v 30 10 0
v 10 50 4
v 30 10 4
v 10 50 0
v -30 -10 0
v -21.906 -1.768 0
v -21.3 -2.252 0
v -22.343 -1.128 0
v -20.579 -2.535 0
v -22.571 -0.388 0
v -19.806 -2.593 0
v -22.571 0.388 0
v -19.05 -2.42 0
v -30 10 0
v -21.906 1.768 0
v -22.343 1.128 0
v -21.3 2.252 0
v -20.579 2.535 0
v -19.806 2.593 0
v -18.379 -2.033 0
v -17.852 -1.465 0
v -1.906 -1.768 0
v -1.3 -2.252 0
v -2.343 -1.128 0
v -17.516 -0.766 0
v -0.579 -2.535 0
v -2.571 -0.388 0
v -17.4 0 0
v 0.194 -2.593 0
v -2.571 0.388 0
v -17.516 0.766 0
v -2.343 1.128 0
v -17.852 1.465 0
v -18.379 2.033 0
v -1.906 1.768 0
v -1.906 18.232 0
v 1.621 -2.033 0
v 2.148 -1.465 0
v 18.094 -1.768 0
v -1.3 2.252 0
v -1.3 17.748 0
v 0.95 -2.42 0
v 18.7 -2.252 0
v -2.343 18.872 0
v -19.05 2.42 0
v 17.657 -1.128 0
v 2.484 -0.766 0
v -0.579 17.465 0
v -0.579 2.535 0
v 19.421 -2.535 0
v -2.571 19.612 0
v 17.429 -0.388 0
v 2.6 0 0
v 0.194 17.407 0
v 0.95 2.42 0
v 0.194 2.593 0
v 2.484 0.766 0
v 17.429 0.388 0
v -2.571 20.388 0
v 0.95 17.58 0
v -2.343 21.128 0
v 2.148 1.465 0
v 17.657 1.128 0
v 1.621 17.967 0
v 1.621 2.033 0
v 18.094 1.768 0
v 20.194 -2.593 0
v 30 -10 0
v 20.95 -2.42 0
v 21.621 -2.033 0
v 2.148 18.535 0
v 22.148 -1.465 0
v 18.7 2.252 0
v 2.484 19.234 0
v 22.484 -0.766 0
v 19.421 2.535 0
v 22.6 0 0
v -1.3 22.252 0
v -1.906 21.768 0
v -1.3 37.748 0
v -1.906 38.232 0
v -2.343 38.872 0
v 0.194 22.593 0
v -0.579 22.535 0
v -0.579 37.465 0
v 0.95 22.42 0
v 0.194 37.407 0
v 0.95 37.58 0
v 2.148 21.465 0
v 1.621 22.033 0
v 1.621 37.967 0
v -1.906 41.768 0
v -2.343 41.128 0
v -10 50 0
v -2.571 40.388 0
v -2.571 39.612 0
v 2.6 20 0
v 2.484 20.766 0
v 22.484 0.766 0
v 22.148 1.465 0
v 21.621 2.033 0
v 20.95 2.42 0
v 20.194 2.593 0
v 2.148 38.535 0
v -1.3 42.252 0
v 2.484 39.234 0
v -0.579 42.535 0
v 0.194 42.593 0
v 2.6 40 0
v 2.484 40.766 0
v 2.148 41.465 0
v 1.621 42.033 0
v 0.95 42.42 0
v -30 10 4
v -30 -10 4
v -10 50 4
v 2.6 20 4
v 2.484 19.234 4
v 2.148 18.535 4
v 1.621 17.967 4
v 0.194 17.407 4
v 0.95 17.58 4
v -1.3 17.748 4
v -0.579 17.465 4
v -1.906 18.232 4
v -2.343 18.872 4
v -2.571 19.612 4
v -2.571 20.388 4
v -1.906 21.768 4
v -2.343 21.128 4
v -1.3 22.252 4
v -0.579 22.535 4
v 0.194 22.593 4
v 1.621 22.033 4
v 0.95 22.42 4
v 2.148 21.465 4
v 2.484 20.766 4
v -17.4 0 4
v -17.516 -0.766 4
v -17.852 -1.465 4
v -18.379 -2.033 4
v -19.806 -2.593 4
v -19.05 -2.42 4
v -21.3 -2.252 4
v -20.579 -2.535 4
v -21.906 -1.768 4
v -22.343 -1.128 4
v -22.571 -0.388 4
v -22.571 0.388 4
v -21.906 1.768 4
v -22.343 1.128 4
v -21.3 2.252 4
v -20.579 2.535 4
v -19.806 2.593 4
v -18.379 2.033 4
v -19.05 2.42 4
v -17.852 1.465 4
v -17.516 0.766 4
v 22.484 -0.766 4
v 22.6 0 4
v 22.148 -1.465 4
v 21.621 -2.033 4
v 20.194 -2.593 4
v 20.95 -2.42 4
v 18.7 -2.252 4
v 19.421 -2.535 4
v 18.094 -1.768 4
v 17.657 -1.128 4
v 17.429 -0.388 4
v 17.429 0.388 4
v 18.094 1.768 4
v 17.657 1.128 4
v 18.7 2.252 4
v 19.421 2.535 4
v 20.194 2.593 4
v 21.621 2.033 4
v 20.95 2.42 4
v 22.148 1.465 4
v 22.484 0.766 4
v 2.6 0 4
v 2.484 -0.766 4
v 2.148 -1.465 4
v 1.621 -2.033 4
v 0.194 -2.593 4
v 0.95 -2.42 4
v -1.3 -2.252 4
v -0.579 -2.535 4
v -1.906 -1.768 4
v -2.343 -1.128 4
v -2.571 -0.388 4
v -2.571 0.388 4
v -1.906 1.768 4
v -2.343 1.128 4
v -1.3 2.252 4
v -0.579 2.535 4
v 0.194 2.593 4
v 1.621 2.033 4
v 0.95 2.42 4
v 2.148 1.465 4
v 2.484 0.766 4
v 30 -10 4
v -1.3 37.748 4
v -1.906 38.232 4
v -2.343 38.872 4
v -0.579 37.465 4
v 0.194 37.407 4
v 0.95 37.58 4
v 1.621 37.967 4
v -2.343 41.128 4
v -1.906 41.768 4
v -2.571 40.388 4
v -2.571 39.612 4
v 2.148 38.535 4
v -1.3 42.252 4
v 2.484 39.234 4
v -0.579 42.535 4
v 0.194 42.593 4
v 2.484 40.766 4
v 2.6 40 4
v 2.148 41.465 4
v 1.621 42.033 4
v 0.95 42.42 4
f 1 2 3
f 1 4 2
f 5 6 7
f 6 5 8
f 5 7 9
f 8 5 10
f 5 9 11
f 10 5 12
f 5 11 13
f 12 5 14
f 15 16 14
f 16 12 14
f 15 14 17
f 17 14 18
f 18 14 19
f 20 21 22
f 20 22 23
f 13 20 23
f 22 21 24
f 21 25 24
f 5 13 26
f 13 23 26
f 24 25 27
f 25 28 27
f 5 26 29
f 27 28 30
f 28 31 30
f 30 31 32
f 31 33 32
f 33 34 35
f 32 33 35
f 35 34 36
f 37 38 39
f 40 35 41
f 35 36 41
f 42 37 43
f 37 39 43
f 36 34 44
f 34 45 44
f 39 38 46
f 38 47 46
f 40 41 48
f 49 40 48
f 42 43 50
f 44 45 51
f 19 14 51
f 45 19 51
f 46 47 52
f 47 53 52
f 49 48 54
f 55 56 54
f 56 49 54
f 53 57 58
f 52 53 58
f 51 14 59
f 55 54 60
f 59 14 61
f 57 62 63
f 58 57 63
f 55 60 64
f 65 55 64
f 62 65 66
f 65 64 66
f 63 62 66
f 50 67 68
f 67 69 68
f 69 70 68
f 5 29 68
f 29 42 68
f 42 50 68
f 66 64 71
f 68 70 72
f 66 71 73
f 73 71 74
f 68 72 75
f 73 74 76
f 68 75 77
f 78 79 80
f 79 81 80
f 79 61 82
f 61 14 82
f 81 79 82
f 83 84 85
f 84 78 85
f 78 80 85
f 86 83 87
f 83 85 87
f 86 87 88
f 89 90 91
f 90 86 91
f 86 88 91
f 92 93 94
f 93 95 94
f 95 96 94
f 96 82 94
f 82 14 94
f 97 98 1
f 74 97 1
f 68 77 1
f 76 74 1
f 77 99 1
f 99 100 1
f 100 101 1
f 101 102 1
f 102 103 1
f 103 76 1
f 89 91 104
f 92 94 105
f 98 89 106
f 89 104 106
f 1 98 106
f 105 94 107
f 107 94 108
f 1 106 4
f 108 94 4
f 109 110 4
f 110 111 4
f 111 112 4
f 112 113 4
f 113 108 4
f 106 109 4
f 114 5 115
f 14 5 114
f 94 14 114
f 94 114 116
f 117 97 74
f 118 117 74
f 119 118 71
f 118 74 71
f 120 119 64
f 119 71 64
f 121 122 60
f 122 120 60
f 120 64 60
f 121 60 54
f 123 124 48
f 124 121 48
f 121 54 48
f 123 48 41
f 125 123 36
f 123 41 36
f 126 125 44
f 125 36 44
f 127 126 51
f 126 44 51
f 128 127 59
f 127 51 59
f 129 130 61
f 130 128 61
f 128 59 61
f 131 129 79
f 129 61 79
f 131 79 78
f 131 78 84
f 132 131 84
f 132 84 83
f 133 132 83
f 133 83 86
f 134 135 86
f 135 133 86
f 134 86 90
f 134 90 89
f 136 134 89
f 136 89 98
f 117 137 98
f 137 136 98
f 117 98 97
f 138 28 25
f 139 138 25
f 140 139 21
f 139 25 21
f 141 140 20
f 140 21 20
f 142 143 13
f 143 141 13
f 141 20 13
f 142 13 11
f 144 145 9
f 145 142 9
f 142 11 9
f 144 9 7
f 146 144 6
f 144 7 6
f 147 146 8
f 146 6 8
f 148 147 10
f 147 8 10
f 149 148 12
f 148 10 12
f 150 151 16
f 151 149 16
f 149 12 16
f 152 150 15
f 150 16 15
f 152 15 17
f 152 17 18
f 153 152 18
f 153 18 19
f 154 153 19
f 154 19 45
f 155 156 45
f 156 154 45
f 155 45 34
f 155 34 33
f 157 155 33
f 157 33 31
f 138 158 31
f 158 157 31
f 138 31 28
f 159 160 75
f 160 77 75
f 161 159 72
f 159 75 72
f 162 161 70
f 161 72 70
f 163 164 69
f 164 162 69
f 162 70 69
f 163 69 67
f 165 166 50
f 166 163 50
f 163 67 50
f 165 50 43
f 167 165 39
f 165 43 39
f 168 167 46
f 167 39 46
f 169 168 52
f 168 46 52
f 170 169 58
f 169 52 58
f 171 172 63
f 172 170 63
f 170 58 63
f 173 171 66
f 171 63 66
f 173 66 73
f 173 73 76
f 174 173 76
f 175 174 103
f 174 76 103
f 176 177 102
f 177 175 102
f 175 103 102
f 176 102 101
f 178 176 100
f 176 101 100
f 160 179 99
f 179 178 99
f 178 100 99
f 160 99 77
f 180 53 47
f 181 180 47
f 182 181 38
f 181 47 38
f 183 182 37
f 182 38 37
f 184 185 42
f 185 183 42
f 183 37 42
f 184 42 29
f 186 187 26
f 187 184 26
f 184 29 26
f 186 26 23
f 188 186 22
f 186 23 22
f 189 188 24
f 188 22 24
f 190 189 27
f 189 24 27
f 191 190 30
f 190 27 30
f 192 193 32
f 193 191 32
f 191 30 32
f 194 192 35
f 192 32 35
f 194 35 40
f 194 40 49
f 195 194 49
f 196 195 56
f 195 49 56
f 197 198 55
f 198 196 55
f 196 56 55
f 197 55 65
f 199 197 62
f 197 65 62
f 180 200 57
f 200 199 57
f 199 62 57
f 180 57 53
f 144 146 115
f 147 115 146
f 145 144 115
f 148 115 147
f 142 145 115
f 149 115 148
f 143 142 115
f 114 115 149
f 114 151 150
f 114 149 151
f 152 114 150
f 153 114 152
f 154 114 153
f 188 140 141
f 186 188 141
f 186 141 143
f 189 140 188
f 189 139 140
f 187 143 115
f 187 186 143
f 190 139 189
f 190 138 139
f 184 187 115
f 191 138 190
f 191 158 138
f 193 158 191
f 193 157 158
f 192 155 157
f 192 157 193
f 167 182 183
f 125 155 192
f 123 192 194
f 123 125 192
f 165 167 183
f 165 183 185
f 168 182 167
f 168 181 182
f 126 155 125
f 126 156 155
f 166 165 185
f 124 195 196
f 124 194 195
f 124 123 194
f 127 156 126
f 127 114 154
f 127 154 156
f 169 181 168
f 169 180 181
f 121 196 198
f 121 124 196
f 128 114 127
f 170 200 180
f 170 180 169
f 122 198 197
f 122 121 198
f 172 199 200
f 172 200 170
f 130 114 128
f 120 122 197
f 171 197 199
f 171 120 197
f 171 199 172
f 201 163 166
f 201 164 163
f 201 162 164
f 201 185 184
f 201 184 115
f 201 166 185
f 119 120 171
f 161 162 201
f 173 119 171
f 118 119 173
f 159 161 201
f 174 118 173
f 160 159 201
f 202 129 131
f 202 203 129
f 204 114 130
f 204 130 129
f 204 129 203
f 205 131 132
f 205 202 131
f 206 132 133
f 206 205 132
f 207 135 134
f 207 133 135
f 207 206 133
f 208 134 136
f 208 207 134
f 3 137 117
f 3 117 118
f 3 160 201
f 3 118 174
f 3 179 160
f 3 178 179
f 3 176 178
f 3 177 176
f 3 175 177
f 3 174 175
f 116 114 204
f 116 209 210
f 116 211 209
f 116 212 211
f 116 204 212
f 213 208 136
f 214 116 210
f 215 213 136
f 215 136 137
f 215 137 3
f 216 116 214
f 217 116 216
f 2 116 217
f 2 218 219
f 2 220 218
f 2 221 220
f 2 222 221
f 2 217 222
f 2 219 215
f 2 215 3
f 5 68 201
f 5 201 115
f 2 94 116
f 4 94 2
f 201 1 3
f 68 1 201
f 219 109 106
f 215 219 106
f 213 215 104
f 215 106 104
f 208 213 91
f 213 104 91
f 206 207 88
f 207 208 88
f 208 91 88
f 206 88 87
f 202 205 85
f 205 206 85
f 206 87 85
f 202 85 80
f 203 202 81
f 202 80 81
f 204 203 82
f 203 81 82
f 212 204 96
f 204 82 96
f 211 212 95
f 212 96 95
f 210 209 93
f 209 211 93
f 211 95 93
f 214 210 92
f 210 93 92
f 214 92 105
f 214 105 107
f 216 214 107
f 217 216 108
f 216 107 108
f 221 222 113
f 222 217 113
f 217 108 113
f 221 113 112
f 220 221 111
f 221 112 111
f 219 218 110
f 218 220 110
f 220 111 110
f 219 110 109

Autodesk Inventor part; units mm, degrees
ref_plane "YZ Plane" through (0, 0, 0) normal (1, 0, 0) x (0, 1, 0)
ref_plane "XZ Plane" through (0, 0, 0) normal (0, 1, 0) x (-1, 0, 0)
ref_plane "XY Plane" through (0, 0, 0) normal (0, 0, 1) x (1, 0, 0)
sketch "Sketch1" plane through (0, 0, 0) normal (0, 0, 1) x (1, 0, 0)
  line L0 (30, -10) -> (-30, -10)
  line L1 (0, 30.1987) -> (0, -10) construction
  line L2 (-30, -10) -> (-30, 10)
  line L3 (-30, 10) -> (-10, 50)
  line L4 (-10, 50) -> (10, 50)
  line L5 (10, 50) -> (30, 10)
  line L6 (30, 10) -> (30, -10)
  circle A0 centre (0, 0) radius 2.6
  circle A1 centre (-20, 0) radius 2.6
  circle A2 centre (20, 0) radius 2.6
  circle A3 centre (0, 0) radius 2.6
  circle A4 centre (0, 20) radius 2.6
  circle A5 centre (0, 40) radius 2.6
  point P0 (0, 50)
  dimension "d2" = 20
  dimension "d3" = 20
  dimension "d4" = 60
  dimension "d5" = 60
  dimension "d6" = 5.2
  dimension "d8" = 10
  dimension "d11" = 20
  dimension "d14" = 20
  dimension "d19" = 20
extrude "Extrusion1" add sketch "Sketch1" along normal blind 4
properties part number "T joining plate"
